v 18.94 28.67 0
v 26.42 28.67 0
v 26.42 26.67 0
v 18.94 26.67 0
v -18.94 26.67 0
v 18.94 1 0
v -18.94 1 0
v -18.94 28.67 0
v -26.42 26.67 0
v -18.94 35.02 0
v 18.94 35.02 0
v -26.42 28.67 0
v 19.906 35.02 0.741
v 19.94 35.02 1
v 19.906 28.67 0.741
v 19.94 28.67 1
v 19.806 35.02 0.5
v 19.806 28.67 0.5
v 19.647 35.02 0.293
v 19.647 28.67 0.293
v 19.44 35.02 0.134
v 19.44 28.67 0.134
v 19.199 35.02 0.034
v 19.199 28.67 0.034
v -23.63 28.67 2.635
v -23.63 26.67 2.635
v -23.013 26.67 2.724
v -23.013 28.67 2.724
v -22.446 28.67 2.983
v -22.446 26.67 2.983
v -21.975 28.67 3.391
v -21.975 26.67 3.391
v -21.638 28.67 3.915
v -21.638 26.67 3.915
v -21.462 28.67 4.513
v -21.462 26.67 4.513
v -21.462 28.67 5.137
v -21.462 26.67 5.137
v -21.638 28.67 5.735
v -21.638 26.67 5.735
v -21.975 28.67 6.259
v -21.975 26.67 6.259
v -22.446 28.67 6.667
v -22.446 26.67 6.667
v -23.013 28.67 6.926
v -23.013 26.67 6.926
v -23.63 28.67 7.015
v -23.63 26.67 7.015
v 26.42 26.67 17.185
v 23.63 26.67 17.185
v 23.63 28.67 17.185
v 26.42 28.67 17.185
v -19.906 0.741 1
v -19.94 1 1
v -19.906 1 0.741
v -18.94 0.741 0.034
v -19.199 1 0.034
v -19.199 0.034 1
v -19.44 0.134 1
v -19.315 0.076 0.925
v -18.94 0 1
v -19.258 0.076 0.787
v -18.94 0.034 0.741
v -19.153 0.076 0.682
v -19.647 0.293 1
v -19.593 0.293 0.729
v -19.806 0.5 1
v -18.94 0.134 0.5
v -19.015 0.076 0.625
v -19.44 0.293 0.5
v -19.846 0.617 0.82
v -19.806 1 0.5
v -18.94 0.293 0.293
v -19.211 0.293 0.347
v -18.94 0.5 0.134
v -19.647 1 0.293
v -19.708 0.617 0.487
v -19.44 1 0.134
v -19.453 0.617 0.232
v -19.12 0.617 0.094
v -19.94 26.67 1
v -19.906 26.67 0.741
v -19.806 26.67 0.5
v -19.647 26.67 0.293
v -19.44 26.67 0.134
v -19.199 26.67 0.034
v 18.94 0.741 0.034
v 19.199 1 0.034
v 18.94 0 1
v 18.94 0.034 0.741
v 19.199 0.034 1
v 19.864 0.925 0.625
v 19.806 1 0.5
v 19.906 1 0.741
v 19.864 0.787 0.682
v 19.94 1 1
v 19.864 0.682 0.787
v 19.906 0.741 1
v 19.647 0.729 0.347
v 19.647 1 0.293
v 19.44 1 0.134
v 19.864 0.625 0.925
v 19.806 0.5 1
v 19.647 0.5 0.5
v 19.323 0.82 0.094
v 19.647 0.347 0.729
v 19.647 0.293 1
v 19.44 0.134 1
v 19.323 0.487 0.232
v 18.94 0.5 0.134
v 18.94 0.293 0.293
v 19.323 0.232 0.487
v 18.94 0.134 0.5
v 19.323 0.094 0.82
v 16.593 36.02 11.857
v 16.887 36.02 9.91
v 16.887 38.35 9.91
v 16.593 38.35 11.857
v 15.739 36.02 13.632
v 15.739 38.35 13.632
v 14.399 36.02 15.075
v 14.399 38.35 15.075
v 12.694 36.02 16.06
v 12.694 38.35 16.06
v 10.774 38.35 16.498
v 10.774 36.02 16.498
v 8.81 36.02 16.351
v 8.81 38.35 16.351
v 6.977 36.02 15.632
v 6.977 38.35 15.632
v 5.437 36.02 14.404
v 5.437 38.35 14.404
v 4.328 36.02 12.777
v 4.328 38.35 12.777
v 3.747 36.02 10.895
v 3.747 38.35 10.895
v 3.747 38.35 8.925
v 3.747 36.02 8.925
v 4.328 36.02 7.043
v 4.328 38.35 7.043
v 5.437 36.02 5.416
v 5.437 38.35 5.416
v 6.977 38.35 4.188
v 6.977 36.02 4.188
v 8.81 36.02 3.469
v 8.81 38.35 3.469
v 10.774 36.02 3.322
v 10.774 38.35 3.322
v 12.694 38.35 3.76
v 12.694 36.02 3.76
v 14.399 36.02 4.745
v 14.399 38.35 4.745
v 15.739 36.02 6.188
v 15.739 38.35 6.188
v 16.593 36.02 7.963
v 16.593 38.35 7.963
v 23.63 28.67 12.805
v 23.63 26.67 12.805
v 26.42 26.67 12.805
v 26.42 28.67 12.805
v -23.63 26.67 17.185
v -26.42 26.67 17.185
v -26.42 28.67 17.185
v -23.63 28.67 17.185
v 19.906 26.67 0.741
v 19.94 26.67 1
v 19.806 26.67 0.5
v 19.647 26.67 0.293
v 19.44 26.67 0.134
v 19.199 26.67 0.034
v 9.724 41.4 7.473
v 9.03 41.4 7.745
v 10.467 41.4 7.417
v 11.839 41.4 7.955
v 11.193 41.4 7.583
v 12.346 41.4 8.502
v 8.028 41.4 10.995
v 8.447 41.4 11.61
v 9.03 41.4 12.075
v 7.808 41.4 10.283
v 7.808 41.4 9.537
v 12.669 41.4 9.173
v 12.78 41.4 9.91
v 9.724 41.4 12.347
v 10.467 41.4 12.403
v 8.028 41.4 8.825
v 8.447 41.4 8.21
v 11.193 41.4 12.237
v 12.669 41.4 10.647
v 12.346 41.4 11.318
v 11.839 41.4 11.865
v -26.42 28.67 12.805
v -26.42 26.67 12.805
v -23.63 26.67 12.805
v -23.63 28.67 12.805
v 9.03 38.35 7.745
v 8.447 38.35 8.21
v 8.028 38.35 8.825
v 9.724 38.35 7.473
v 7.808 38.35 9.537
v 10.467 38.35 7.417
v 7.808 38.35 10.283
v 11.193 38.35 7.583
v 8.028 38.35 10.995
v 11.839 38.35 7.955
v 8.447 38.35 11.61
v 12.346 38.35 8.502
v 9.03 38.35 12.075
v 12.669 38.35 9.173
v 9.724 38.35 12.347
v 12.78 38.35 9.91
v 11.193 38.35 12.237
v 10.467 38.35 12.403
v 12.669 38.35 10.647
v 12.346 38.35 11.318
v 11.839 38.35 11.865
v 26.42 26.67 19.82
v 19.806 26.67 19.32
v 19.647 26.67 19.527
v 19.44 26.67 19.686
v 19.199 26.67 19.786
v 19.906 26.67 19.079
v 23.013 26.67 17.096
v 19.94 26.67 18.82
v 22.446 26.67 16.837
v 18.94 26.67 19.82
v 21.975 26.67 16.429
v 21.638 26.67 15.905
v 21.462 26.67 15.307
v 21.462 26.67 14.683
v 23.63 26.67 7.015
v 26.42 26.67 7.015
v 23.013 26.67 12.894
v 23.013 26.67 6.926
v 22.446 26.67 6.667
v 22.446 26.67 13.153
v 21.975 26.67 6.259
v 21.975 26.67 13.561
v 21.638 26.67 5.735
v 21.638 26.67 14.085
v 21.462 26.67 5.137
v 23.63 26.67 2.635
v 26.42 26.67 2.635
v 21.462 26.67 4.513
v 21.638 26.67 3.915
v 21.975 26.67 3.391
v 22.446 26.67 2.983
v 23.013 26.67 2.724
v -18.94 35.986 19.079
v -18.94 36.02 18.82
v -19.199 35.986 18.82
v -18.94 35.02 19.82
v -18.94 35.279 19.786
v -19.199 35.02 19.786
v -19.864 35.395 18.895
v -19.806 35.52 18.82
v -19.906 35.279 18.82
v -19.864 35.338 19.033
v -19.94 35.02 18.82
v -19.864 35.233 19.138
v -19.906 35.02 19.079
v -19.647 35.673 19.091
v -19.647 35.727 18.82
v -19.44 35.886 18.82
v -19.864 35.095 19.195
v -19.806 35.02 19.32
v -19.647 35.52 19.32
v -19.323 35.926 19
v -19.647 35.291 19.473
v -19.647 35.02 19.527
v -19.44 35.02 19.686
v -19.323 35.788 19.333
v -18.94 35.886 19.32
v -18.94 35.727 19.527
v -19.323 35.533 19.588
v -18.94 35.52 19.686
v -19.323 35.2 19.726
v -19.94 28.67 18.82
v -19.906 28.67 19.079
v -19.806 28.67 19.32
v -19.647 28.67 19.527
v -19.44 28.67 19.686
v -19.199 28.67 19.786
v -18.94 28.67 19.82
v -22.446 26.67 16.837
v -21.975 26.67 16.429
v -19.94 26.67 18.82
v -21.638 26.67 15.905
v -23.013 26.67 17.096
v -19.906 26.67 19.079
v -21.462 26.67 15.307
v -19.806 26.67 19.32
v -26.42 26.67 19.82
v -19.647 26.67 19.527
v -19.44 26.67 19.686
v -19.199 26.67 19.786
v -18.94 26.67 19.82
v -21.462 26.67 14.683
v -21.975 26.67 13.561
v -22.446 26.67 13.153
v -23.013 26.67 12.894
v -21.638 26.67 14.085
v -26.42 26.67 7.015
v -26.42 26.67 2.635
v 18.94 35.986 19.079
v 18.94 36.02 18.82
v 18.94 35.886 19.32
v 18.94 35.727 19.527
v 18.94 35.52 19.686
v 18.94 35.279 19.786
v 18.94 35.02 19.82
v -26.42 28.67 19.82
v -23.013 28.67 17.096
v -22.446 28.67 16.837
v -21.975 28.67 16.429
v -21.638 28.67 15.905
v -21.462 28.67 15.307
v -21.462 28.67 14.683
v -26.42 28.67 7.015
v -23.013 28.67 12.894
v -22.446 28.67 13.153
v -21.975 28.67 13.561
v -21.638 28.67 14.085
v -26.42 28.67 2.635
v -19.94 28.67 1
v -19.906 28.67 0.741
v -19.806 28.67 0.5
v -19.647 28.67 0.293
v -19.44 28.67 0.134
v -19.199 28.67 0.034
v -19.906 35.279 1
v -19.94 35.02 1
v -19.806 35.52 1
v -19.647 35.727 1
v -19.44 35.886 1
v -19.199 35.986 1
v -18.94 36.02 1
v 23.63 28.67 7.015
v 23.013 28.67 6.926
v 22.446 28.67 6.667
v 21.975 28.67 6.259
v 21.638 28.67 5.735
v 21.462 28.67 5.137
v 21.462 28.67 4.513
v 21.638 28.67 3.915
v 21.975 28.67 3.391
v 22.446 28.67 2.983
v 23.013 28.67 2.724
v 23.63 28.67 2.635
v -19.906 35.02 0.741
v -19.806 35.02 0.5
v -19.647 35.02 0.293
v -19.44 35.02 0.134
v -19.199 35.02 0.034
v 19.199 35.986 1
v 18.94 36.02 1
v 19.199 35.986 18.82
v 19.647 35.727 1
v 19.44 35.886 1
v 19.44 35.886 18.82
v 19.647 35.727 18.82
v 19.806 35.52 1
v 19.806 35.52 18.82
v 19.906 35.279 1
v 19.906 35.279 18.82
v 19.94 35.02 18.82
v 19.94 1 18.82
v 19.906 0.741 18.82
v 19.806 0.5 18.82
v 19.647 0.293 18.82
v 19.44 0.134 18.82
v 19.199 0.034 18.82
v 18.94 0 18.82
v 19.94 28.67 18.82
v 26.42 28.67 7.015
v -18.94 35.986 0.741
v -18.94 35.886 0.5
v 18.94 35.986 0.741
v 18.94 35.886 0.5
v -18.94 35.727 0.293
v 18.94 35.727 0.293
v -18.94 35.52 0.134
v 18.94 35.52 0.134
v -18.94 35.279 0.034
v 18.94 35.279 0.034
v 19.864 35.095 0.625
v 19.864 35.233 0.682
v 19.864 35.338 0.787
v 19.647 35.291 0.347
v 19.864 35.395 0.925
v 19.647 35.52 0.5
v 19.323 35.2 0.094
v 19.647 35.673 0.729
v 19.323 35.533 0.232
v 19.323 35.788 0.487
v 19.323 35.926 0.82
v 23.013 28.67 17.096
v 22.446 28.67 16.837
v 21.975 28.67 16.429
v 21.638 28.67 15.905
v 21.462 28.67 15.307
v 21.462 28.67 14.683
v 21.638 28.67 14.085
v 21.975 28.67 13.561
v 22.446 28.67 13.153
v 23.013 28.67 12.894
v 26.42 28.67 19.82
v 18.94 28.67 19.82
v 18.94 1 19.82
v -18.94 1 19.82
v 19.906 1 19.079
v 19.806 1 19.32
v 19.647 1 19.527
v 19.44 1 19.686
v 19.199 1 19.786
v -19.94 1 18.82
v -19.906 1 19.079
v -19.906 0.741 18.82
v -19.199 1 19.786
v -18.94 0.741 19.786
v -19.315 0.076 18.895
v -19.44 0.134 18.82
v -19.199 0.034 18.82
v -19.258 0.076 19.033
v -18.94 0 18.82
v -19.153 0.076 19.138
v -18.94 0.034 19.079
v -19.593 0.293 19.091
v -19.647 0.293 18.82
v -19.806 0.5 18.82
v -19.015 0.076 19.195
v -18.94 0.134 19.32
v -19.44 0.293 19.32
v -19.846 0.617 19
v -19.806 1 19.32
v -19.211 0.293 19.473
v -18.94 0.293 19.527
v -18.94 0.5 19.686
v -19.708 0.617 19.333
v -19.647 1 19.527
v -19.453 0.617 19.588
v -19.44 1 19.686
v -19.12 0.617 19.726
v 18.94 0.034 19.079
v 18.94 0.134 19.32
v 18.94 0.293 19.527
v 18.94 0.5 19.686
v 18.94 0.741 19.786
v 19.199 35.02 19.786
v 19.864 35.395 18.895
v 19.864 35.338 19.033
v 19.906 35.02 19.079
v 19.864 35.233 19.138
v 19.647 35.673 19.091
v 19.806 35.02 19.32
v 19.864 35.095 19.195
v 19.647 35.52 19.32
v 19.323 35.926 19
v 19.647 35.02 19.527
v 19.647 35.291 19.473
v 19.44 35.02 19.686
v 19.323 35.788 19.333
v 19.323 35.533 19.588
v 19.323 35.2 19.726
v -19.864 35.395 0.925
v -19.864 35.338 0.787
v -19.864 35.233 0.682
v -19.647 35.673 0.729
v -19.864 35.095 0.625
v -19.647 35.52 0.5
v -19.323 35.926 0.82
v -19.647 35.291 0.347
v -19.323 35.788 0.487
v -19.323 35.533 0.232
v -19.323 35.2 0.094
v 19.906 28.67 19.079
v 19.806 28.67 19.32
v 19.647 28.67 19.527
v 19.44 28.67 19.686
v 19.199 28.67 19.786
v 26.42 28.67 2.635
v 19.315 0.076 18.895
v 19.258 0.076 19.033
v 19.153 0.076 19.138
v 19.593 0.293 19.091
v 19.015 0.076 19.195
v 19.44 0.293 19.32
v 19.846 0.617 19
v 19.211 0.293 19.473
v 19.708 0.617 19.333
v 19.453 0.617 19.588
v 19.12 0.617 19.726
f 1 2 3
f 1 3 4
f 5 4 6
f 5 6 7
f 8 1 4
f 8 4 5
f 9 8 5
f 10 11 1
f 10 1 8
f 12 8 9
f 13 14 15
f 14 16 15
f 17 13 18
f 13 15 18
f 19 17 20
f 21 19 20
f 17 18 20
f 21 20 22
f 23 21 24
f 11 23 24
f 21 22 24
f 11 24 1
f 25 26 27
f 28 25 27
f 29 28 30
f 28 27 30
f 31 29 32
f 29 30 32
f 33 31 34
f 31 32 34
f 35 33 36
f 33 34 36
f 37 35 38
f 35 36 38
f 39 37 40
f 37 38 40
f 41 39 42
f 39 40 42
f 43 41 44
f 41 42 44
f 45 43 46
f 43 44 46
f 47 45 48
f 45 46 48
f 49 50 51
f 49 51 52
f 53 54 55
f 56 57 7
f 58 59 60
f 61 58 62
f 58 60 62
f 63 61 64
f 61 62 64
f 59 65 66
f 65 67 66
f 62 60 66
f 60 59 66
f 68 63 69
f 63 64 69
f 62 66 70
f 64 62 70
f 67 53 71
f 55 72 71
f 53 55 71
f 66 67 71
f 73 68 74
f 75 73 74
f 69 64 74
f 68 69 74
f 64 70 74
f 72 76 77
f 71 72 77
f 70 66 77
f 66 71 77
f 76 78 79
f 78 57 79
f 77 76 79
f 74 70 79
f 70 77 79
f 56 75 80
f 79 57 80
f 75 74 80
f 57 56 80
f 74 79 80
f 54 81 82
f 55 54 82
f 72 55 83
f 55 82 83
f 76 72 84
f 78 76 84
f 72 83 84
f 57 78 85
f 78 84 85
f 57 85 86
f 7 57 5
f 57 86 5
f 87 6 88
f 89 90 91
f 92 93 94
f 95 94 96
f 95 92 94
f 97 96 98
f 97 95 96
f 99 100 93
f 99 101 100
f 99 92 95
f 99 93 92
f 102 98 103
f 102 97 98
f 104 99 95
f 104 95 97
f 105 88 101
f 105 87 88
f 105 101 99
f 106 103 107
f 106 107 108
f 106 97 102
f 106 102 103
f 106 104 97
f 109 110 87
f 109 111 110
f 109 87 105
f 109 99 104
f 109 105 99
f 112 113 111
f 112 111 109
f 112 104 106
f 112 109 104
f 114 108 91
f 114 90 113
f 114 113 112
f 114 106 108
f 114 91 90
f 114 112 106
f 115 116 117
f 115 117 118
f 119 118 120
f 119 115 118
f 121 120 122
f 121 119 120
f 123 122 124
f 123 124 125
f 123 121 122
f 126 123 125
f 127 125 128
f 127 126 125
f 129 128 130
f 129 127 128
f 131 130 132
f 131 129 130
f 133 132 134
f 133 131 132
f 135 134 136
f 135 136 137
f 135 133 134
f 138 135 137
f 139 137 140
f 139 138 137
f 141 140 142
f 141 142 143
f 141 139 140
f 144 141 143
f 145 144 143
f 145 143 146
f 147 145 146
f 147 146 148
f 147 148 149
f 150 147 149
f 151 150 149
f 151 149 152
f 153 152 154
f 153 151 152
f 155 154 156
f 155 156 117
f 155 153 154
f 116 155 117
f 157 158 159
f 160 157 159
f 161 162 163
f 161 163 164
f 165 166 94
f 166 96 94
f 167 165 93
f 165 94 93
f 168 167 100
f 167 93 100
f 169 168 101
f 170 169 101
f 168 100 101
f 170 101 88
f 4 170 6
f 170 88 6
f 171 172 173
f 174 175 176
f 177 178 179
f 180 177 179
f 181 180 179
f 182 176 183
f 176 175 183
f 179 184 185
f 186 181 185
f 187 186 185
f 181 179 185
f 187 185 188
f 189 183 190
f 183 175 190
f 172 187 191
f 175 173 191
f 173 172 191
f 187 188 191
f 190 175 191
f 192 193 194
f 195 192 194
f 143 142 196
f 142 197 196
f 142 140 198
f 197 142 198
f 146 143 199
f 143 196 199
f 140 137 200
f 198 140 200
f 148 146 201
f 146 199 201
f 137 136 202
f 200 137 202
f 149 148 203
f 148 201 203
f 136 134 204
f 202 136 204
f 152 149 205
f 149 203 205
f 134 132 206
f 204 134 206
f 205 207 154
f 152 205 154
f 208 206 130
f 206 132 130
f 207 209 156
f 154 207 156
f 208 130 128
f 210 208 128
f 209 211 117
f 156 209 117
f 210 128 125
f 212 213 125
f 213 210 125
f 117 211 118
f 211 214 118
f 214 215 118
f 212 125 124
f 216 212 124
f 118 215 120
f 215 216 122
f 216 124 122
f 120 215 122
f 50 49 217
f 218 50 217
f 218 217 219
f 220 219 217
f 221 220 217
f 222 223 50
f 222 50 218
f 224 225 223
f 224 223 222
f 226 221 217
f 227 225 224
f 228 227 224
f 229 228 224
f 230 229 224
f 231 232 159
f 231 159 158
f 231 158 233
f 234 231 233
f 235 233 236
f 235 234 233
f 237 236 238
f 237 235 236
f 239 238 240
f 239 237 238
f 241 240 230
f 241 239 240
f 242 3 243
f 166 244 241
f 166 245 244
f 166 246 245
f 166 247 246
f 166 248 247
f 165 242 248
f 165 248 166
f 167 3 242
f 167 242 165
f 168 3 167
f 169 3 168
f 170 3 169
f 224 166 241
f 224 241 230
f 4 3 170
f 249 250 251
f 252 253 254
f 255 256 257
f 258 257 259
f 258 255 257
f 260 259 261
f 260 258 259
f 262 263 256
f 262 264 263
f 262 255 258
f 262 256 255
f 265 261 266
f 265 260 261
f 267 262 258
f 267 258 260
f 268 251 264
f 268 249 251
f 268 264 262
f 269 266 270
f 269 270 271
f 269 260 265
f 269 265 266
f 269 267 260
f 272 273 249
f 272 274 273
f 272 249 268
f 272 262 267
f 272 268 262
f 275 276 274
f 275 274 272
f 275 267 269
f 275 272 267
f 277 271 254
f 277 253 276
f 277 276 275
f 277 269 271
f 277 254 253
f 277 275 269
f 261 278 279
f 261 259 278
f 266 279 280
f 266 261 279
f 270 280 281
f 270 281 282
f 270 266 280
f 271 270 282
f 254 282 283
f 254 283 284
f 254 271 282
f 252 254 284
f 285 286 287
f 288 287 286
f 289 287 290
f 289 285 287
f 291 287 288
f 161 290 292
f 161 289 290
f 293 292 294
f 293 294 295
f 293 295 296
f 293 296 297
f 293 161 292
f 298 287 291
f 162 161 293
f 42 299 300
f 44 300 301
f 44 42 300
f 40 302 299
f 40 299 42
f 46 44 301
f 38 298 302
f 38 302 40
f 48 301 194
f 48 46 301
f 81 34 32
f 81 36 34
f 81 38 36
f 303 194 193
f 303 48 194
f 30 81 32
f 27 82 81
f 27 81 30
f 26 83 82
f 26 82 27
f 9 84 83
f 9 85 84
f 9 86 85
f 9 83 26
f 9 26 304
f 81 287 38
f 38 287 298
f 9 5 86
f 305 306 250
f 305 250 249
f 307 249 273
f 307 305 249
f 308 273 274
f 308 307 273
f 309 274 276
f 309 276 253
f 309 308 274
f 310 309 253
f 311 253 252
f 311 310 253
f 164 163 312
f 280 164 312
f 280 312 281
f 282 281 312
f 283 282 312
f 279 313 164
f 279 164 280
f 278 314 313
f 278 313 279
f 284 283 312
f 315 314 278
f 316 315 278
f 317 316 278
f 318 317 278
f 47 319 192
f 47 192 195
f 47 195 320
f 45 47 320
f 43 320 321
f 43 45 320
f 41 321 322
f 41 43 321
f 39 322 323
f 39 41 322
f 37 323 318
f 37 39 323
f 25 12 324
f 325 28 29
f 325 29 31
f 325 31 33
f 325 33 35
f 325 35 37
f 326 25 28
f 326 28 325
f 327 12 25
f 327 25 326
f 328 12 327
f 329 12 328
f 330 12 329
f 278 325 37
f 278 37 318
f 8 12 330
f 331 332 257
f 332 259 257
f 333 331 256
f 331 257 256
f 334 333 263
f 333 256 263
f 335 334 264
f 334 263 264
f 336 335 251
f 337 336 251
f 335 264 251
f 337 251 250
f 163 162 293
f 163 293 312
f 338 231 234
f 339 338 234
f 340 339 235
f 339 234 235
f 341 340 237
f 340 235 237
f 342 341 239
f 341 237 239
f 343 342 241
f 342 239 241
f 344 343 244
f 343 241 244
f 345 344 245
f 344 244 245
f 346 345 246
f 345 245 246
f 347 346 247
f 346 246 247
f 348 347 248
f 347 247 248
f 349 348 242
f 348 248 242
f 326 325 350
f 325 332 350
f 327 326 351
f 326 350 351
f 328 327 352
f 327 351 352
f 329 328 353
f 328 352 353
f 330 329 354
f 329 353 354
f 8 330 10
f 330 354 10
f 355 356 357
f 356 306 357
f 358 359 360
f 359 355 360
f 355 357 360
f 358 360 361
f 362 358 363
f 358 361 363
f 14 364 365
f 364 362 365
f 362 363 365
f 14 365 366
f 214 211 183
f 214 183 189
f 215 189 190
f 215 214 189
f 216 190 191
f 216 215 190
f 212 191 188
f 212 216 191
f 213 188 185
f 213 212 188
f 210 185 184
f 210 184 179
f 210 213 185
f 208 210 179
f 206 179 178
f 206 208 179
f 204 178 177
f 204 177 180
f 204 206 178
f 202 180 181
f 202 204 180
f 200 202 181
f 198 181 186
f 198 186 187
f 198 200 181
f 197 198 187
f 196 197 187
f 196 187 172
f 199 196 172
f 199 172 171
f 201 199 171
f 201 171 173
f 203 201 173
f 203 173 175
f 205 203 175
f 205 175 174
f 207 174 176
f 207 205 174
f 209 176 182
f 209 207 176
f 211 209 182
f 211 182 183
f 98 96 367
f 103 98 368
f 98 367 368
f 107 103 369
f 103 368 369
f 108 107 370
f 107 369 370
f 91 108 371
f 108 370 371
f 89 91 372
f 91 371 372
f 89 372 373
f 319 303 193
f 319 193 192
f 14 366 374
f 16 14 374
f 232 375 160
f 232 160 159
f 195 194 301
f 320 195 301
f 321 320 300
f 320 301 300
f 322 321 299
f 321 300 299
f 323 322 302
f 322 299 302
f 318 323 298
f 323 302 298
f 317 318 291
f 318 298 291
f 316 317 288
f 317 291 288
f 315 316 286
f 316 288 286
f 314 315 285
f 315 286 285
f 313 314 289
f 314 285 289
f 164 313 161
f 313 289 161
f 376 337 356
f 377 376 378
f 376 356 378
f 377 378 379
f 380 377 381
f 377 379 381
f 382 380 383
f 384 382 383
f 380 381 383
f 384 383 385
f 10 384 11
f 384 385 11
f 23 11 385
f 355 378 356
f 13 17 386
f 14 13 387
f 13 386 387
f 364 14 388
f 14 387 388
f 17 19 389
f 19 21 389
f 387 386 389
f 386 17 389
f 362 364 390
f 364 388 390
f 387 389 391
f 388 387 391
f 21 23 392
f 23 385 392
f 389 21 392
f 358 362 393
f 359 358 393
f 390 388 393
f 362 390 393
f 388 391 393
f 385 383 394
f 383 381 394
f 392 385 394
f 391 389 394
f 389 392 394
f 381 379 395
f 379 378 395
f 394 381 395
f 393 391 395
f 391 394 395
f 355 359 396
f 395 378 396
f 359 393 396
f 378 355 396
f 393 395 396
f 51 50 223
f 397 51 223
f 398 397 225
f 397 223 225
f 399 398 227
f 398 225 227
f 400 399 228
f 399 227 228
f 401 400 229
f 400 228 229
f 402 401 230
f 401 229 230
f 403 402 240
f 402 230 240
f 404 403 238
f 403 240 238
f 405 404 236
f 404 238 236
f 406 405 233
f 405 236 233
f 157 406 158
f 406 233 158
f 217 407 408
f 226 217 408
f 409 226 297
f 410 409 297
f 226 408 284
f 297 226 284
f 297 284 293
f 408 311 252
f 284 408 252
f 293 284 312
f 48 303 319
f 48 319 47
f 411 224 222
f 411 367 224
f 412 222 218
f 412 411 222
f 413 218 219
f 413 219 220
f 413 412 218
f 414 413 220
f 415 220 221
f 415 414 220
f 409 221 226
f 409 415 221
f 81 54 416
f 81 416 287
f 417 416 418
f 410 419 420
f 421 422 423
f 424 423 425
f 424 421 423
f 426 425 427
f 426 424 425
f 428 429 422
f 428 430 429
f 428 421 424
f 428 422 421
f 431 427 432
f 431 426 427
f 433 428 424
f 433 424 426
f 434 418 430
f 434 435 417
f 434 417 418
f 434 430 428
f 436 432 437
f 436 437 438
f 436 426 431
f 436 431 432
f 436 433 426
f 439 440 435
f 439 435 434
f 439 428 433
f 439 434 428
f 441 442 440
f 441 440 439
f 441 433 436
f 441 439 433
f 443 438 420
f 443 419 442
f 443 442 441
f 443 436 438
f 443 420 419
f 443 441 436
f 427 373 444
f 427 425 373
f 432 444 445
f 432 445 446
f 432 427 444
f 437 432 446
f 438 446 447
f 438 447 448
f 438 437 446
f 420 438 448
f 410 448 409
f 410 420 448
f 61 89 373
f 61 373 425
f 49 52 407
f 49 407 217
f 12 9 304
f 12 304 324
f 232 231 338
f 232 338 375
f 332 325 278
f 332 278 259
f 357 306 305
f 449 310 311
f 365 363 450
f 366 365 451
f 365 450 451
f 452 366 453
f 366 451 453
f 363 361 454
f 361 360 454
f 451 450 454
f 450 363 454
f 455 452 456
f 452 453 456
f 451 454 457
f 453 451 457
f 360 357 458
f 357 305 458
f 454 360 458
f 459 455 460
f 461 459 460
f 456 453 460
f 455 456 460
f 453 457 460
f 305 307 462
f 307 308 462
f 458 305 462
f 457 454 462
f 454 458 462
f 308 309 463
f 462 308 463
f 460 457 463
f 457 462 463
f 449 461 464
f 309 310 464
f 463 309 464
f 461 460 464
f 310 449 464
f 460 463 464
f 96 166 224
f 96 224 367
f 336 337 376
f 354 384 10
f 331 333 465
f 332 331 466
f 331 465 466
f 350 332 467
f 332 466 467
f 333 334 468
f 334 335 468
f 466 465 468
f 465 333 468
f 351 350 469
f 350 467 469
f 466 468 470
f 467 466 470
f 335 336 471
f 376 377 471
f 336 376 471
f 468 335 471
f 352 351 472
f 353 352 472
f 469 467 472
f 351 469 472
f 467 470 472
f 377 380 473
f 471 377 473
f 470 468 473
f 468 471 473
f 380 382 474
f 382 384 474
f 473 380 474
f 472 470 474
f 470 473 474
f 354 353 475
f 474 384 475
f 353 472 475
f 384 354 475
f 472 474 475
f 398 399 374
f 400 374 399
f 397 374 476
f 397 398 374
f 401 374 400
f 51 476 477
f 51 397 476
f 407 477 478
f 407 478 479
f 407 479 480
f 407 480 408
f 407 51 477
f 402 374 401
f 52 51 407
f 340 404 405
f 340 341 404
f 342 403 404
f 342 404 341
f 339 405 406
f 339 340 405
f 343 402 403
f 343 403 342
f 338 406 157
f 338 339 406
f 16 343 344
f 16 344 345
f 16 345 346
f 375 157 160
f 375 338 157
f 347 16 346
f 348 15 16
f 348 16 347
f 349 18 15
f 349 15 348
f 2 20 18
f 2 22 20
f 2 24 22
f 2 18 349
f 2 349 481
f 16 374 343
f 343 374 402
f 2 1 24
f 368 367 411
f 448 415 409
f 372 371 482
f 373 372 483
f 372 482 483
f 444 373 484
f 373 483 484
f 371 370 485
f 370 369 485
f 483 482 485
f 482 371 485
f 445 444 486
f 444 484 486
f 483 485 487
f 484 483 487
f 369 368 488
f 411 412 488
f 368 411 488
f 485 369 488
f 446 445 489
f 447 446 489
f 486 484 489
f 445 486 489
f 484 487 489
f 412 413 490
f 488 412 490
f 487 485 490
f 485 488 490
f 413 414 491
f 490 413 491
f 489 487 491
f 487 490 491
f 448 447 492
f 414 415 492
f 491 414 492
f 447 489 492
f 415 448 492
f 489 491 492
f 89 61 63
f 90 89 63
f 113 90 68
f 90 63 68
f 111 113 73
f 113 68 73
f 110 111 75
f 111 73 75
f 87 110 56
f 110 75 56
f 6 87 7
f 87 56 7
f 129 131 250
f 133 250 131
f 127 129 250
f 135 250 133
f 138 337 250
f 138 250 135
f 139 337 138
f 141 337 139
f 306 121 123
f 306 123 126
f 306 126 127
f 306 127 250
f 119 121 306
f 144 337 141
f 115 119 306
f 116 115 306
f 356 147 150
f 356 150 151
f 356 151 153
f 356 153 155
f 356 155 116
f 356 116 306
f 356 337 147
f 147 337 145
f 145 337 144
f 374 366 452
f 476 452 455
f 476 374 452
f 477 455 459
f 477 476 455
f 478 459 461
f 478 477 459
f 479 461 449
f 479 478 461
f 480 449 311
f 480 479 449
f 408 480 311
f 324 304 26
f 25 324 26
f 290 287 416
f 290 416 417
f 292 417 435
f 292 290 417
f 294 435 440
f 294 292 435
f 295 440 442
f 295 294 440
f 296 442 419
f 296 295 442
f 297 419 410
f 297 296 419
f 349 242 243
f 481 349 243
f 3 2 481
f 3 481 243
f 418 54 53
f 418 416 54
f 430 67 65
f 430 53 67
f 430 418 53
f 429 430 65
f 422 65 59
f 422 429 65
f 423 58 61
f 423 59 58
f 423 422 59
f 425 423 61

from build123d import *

# Parameters (mm, degrees)
PAD002_DEPTH = 36.02
PAD003_DEPTH = 36.02
PAD004_DEPTH = 36.02
PAD001_DEPTH = 36.02
SKETCH005_R  = 2.5
PAD005_DEPTH = 3.05
SKETCH006_R  = 6.606667
PAD006_DEPTH = 2.33
PAD_DEPTH    = 19.82
FILLET_R     = 1


with BuildPart() as body002:
    # Sketch002 → Pad002 (new body)
    with BuildSketch(Plane.XZ):
        with BuildLine():
            ThreePointArc((-32.39, 17.185), (-34.58, 14.995), (-32.39, 12.805))
            Line((-32.39, 12.805), (-23.63, 12.805))
            ThreePointArc((-23.63, 12.805), (-21.44, 14.995), (-23.63, 17.185))
            Line((-32.39, 17.185), (-23.63, 17.185))
        make_face()
    extrude(amount=-PAD002_DEPTH)


with BuildPart() as body003:
    # Sketch003 → Pad003 (new body)
    with BuildSketch(Plane.XZ):
        with BuildLine():
            ThreePointArc((23.63, 7.015), (21.44, 4.825), (23.63, 2.635))
            Line((23.63, 2.635), (32.39, 2.635))
            ThreePointArc((32.39, 2.635), (34.58, 4.825), (32.39, 7.015))
            Line((23.63, 7.015), (32.39, 7.015))
        make_face()
    extrude(amount=-PAD003_DEPTH)


with BuildPart() as body004:
    # Sketch004 → Pad004 (new body)
    with BuildSketch(Plane.XZ):
        with BuildLine():
            ThreePointArc((23.63, 17.185), (21.44, 14.995), (23.63, 12.805))
            Line((23.63, 12.805), (32.39, 12.805))
            ThreePointArc((32.39, 12.805), (34.58, 14.995), (32.39, 17.185))
            Line((23.63, 17.185), (32.39, 17.185))
        make_face()
    extrude(amount=-PAD004_DEPTH)


with BuildPart() as fusion:
    # Sketch001 → Pad001 (new body)
    with BuildSketch(Plane.XZ):
        with BuildLine():
            ThreePointArc((-32.39, 7.015), (-34.58, 4.825), (-32.39, 2.635))
            Line((-32.39, 2.635), (-23.63, 2.635))
            ThreePointArc((-23.63, 2.635), (-21.44, 4.825), (-23.63, 7.015))
            Line((-32.39, 7.015), (-23.63, 7.015))
        make_face()
    extrude(amount=-PAD001_DEPTH)

    # Fusion: union Body002, Body003, Body004
    add(body002.part)
    add(body003.part)
    add(body004.part)


with BuildPart() as body005:
    # Sketch005 → Pad005 (new body)
    with BuildSketch(Plane.XZ):
        with Locations((10.28, 9.91)):
            Circle(SKETCH005_R)
    extrude(amount=-PAD005_DEPTH)


with BuildPart() as body005_1:
    # Body005 placement: moved
    add(body005.part.moved(Location((0, 38.35, 0))))


with BuildPart() as body006:
    # Sketch006 → Pad006 (new body)
    with BuildSketch(Plane.XZ):
        with Locations((10.28, 9.91)):
            Circle(SKETCH006_R)
    extrude(amount=-PAD006_DEPTH)


with BuildPart() as body006_1:
    # Body006 placement: moved
    add(body006.part.moved(Location((0, 36.02, 0))))


with BuildPart() as cut:
    # Sketch → Pad (new body)
    with BuildSketch(Plane.XY):
        Polygon((-19.94, 0), (-19.94, 26.67), (-26.42, 26.67), (-26.42, 28.67), (-19.94, 28.67), (-19.94, 36.02), (19.94, 36.02), (19.94, 28.67), (26.42, 28.67), (26.42, 26.67), (19.94, 26.67), (19.94, 0), align=None)
    extrude(amount=PAD_DEPTH)

    # Fillet
    fillet_edges = [cut.edges().sort_by_distance(p)[0] for p in [
        (0, 36.02, 19.82),
        (0, 36.02, 0),
        (-19.94, 36.02, 9.91),
        (-19.94, 32.345, 0),
        (-19.94, 32.345, 19.82),
        (-19.94, 13.335, 0),
        (-19.94, 13.335, 19.82),
        (-19.94, 0, 9.91),
        (0, 0, 0),
        (19.94, 13.335, 0),
        (19.94, 32.345, 0),
        (19.94, 36.02, 9.91),
        (19.94, 32.345, 19.82),
        (19.94, 13.335, 19.82),
        (19.94, 0, 9.91),
        (0, 0, 19.82),
    ]]
    fillet(fillet_edges, radius=FILLET_R)

    # Fusion001: union Body005, Body006
    add(body005_1.part)
    add(body006_1.part)

    # Cut: cut Fusion
    add(fusion.part, mode=Mode.SUBTRACT)


solid = cut.part
